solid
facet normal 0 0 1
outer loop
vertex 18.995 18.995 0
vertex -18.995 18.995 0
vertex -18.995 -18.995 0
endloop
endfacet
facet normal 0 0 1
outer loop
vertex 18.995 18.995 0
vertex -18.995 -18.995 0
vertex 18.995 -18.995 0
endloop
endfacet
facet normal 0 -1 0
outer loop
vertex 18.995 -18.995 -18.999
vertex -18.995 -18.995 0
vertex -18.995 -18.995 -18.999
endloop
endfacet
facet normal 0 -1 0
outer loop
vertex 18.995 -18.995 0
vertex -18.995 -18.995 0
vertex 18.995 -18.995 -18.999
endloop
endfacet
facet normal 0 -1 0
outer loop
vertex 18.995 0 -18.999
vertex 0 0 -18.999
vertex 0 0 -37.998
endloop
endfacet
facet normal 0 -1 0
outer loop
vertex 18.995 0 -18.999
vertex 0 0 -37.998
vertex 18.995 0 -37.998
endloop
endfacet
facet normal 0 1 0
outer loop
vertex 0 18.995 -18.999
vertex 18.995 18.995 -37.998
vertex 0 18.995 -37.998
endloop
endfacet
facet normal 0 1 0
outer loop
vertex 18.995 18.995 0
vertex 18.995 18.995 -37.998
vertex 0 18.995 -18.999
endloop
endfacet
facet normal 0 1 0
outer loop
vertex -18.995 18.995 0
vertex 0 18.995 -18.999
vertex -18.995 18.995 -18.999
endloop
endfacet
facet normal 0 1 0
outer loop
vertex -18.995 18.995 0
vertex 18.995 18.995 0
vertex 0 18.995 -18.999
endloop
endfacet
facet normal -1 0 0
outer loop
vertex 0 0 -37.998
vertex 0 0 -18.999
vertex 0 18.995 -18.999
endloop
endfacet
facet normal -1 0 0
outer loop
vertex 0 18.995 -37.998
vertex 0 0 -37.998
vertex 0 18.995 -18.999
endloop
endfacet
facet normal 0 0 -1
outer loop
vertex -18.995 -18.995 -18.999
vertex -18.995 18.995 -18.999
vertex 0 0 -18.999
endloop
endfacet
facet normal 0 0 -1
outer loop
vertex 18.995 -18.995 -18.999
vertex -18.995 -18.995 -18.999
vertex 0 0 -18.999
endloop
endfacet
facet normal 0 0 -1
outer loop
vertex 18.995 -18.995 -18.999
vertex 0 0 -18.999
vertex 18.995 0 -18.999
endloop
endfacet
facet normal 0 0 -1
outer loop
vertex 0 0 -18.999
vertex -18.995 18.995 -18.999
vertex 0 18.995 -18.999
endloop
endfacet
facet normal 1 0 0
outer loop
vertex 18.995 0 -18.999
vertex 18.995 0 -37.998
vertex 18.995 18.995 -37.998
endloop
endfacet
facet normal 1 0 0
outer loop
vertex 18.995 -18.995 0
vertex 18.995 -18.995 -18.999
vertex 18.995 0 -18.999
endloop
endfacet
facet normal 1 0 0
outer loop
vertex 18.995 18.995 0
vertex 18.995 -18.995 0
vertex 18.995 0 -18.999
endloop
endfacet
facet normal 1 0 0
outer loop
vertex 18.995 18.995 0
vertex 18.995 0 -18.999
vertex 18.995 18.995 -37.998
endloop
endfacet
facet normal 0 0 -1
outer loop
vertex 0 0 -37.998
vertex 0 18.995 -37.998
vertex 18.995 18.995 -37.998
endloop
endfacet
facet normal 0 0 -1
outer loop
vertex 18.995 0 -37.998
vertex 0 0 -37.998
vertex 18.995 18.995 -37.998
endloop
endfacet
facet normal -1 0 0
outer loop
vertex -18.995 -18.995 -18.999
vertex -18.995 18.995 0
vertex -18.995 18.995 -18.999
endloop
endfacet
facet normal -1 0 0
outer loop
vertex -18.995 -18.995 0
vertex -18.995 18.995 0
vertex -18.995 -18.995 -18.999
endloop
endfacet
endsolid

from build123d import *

# Parameters (mm, degrees)
F0_W     = 18.995179
F0_H     = 18.995181
F1_DEPTH = 37.9984
F0_W_2   = 18.995181
F2_DEPTH = 18.9992


with BuildPart() as f1:
    # F0 (on Top) → F1 (new body)
    with BuildSketch(Plane.XY):
        with Locations((9.49759, 9.49759)):
            Rectangle(F0_W, F0_H)
    extrude(amount=-F1_DEPTH)

    # F0 (on Top) → F2 (join)
    with BuildSketch(Plane.XY):
        with Locations((-9.49759, -9.49759)):
            Rectangle(F0_W_2, F0_H)
        with Locations((-9.49759, 9.49759)):
            Rectangle(F0_W_2, F0_H)
        with Locations((9.49759, 9.49759)):
            Rectangle(F0_W, F0_H)
        with Locations((9.49759, -9.49759)):
            Rectangle(F0_W, F0_H)
    extrude(amount=-F2_DEPTH)


solid = f1.part
